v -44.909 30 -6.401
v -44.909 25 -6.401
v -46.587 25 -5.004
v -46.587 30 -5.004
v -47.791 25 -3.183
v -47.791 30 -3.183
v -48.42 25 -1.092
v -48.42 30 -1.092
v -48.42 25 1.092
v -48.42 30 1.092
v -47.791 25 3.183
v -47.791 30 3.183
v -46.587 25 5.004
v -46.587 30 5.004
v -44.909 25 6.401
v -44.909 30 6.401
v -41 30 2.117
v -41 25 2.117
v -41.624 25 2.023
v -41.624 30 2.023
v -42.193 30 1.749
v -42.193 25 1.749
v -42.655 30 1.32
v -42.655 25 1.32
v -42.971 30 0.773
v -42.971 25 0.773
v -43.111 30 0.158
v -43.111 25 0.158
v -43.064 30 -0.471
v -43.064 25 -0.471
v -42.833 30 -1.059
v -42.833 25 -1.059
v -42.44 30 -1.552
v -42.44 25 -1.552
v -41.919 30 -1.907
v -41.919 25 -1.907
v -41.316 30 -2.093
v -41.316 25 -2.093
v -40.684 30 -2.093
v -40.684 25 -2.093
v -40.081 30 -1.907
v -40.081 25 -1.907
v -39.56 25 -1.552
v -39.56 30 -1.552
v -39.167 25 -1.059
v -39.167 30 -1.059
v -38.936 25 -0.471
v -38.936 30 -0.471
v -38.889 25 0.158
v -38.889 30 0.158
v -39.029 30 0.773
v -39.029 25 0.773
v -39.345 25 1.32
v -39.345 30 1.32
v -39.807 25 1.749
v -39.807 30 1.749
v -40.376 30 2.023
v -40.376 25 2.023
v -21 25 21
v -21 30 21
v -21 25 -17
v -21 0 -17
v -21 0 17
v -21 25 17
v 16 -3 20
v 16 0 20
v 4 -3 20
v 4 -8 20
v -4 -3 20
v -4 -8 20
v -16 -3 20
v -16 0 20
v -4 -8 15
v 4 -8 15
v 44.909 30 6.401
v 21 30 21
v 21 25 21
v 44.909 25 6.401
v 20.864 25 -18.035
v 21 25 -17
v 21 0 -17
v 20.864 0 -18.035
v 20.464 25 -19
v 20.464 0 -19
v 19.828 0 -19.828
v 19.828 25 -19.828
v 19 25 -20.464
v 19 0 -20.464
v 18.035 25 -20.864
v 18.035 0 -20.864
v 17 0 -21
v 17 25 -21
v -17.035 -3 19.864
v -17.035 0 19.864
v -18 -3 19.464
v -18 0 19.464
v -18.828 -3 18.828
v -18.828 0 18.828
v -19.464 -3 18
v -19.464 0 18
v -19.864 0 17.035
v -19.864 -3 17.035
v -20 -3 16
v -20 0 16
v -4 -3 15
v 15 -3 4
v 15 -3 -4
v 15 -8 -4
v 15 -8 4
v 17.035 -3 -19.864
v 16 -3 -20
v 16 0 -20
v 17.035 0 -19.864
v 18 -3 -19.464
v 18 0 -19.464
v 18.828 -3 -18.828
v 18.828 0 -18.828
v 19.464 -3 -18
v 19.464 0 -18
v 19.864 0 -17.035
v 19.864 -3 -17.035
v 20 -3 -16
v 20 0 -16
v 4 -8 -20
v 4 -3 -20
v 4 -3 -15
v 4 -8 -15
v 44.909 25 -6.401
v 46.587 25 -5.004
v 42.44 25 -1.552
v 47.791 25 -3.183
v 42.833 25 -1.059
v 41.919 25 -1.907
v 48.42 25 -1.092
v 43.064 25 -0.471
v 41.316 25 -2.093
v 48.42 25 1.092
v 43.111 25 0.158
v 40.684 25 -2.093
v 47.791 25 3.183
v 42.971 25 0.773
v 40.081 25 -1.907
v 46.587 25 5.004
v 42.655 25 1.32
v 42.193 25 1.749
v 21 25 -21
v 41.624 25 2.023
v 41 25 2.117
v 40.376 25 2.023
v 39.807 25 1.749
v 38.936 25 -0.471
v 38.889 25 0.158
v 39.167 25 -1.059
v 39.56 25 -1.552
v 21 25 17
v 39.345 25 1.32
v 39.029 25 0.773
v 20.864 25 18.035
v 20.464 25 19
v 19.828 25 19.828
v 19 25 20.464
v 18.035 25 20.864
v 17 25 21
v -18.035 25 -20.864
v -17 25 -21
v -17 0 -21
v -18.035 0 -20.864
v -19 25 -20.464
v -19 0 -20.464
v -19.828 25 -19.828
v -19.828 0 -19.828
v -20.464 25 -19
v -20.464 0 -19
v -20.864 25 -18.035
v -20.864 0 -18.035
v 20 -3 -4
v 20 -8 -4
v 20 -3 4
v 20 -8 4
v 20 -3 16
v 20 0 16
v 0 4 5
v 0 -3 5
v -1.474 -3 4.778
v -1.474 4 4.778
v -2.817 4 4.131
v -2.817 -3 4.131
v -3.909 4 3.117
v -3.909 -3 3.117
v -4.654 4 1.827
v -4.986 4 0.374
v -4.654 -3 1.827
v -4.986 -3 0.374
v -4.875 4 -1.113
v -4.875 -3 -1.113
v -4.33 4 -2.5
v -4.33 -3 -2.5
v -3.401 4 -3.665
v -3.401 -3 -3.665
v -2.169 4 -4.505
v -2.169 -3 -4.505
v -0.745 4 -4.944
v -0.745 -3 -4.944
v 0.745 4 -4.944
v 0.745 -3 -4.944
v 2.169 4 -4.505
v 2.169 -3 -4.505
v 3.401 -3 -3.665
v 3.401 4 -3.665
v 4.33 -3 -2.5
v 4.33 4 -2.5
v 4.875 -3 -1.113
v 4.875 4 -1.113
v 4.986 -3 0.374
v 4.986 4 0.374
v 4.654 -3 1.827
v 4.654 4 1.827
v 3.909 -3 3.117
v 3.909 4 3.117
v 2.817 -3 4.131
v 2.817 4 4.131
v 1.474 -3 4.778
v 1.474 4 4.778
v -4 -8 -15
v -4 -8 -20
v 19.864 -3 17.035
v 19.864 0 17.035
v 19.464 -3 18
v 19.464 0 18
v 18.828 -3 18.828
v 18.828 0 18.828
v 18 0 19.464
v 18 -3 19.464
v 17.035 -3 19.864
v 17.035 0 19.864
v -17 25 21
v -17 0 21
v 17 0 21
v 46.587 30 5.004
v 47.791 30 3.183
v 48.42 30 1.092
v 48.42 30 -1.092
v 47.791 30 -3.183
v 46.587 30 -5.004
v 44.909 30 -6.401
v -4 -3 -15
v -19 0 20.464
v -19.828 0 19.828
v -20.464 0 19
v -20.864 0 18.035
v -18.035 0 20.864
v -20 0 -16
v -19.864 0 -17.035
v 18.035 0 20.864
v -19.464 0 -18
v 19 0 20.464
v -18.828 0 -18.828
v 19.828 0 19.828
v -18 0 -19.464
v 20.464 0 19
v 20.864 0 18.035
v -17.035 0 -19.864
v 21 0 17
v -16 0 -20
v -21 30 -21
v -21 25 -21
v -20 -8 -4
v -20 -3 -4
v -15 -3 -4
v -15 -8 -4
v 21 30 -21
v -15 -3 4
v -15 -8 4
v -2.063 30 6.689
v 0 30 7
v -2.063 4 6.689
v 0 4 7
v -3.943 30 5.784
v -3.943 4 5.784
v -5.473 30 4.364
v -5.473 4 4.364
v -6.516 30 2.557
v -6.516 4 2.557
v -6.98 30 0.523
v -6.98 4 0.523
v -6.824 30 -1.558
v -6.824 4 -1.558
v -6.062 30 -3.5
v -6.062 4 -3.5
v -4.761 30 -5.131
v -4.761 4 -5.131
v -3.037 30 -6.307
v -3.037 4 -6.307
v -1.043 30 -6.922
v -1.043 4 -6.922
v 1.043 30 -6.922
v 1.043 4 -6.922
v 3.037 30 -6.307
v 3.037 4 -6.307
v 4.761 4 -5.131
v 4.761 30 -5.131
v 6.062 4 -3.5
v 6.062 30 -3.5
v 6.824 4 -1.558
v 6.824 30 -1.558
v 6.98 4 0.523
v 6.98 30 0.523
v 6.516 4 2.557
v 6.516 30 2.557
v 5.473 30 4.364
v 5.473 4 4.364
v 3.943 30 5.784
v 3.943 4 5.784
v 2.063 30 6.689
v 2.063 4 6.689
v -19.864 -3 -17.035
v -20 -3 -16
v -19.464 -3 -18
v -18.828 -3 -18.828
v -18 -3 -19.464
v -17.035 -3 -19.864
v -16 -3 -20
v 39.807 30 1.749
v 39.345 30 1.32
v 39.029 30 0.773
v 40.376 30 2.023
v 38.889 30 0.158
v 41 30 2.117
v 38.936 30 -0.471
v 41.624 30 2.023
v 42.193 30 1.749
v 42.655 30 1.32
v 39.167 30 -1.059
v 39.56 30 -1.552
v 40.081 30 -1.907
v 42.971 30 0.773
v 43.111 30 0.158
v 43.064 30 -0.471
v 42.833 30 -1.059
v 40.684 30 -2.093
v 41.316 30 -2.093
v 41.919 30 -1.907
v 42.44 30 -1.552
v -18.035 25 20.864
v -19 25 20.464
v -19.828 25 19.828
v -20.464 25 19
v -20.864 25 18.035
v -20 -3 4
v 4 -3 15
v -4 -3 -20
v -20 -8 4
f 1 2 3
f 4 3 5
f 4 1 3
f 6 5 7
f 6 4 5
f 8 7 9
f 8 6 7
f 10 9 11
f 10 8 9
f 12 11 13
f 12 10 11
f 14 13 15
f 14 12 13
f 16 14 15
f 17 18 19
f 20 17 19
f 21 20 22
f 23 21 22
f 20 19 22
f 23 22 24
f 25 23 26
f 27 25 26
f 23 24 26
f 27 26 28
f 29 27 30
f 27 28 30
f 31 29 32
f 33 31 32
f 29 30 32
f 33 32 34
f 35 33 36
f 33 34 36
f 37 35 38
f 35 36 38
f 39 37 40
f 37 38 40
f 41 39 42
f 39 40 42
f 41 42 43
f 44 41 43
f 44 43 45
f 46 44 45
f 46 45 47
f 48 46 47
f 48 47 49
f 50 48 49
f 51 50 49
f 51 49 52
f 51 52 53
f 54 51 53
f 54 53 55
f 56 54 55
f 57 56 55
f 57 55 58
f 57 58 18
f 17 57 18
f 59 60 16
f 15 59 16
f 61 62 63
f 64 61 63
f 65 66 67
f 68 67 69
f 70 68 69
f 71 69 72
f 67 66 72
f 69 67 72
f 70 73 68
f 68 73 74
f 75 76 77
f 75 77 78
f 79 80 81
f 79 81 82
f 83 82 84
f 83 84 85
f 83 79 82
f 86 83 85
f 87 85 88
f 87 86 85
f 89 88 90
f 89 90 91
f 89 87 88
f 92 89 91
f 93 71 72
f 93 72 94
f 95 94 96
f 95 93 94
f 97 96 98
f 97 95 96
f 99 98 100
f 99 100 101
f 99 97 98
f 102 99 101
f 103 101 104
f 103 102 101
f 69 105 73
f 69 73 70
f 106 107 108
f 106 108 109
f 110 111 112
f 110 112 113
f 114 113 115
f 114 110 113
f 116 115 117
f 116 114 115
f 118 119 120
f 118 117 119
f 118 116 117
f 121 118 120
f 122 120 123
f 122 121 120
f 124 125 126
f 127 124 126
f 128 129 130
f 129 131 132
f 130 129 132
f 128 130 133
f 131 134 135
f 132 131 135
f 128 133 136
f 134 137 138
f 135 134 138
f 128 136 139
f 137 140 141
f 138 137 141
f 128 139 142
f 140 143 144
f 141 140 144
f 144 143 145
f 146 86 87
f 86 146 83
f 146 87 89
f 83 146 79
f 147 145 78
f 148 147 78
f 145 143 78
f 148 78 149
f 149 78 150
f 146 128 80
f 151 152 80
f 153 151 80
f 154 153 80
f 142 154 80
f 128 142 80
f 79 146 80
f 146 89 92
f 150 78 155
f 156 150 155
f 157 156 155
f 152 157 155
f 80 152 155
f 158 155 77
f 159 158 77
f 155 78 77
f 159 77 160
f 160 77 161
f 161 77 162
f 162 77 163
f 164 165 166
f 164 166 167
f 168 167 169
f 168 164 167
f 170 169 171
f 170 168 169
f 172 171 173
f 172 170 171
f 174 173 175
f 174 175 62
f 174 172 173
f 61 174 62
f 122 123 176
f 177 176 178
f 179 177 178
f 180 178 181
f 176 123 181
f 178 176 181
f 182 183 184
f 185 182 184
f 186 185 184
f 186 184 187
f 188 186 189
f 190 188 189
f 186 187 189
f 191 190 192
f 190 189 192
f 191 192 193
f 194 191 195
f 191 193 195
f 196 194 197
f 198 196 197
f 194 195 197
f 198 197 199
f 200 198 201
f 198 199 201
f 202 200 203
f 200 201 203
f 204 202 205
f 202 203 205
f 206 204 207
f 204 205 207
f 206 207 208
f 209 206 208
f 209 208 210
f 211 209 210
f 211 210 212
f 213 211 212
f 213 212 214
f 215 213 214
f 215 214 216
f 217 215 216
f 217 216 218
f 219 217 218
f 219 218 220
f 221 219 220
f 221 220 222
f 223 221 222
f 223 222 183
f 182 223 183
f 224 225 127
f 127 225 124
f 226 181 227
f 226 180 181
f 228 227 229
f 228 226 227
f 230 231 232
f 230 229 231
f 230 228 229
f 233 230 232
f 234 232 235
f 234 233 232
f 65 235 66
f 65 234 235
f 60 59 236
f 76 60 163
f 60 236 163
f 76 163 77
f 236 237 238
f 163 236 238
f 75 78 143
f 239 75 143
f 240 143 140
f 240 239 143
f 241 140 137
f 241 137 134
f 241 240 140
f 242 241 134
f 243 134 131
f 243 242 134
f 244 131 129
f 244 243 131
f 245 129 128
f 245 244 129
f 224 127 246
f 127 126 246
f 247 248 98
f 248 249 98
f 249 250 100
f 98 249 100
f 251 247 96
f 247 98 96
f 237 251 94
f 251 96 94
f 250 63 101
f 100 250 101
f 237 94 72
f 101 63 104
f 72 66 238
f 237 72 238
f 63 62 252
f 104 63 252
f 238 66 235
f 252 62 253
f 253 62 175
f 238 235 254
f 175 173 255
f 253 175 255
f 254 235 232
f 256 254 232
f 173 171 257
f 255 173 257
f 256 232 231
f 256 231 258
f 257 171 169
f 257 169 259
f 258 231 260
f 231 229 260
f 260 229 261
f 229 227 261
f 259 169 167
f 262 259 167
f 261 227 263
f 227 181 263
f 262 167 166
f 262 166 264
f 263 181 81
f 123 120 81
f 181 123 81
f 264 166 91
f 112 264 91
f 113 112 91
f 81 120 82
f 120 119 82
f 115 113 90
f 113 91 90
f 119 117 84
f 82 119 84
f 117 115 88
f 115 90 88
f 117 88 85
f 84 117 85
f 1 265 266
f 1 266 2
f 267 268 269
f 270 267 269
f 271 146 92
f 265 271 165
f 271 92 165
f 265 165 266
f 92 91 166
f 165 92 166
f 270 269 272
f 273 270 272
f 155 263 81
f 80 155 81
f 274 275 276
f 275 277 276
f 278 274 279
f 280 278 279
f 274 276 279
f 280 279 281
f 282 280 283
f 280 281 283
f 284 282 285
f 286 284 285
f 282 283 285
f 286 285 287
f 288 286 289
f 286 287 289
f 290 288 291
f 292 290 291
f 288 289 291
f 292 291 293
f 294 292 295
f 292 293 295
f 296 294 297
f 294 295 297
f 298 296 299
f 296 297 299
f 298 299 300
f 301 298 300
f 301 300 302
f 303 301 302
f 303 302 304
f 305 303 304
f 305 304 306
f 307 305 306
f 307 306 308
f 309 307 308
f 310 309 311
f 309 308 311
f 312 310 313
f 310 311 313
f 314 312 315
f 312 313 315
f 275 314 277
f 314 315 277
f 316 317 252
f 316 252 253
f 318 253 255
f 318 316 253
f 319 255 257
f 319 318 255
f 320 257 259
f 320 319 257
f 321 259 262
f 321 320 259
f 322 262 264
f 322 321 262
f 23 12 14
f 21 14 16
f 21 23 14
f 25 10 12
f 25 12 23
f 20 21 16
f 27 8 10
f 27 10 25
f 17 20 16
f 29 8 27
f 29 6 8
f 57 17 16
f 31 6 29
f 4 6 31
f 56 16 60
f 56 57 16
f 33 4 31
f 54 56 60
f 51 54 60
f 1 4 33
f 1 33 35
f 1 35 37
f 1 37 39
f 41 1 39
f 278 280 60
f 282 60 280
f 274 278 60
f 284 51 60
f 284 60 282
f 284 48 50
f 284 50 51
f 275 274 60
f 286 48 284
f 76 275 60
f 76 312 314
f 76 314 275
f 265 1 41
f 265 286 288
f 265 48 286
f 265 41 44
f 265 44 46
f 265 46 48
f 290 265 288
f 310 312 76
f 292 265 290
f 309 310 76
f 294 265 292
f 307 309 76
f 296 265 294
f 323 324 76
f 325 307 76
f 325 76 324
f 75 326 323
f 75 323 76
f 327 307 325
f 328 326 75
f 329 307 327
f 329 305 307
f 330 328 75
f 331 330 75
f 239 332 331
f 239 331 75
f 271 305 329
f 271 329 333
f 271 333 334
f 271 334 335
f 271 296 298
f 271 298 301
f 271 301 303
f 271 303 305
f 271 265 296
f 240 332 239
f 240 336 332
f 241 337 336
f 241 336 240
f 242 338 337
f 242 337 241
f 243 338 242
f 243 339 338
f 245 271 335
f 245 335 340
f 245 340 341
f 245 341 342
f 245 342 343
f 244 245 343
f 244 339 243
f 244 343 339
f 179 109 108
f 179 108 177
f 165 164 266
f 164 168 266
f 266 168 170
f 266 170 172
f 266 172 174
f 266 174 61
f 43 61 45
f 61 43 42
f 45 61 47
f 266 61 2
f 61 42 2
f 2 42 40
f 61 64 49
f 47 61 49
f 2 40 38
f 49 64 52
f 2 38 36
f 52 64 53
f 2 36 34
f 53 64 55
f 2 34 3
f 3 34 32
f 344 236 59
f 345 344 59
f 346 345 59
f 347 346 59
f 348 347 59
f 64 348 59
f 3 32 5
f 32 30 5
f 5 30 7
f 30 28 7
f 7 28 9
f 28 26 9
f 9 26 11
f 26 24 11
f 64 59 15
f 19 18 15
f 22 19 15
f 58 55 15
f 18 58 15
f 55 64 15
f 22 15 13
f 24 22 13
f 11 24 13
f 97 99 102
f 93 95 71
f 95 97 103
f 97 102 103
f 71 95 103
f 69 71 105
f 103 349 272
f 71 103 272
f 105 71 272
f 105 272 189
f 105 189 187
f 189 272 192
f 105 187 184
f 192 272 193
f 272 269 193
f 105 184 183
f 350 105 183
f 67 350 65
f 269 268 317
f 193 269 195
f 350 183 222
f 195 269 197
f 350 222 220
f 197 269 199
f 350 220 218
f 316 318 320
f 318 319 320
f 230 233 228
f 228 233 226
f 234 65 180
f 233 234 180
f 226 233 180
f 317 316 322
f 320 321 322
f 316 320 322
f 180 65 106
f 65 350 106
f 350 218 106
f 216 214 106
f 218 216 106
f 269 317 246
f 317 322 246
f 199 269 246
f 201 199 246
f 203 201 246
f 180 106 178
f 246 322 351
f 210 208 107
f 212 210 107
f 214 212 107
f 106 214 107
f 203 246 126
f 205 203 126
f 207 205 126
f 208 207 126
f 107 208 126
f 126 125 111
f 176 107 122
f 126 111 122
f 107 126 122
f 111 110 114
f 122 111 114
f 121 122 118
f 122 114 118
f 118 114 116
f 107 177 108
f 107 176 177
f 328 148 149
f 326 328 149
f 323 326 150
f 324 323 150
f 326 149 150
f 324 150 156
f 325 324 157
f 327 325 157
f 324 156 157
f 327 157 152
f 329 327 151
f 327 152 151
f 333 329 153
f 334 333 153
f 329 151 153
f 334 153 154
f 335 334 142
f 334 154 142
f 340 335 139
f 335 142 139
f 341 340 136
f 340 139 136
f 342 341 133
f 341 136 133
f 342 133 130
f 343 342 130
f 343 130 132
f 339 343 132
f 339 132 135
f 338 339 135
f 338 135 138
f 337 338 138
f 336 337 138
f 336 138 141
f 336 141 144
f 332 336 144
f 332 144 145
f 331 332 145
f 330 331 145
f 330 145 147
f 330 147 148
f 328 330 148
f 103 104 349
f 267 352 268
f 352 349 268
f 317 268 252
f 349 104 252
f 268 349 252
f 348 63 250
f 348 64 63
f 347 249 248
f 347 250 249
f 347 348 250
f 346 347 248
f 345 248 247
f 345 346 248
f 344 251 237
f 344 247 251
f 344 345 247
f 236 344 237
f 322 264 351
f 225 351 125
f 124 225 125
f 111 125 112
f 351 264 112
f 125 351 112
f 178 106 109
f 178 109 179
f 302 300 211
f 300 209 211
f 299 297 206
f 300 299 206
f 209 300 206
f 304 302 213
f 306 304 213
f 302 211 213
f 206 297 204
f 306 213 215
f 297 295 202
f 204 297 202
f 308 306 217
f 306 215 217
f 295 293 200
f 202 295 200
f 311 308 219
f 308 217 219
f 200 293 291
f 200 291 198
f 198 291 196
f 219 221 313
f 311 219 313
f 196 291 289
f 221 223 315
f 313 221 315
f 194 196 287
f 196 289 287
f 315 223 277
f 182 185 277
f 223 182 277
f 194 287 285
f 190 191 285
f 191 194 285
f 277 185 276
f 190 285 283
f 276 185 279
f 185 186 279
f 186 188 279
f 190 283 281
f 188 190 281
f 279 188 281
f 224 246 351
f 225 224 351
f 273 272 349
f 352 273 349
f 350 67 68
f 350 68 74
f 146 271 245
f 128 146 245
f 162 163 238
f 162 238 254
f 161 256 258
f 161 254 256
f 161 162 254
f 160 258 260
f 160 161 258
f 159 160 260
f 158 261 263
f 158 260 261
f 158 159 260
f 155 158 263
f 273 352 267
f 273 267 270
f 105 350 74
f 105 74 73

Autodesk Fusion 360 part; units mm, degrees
sketch "Sketch1" plane through (0, 0, 0) normal (0, 1, 0) x (1, 0, 0)
  line L0 (20, -20) -> (-20, -20)
  line L1 (-20, -20) -> (-20, 20)
  line L2 (-20, 20) -> (20, 20)
  line L3 (20, 20) -> (20, -20)
  line L4 (20, -20) -> (-20, 20) construction
  line L5 (-20, -20) -> (20, 20) construction
  line L6 (-20, 4) -> (-15, 4)
  line L7 (-15, 4) -> (-15, -4)
  line L8 (-15, -4) -> (-20, -4)
  line L9 (-20, -4) -> (-20, 4)
  line L10 (-4, 20) -> (4, 20)
  line L11 (4, 20) -> (4, 15)
  line L12 (4, 15) -> (-4, 15)
  line L13 (-4, 15) -> (-4, 20)
  line L14 (20, 4) -> (15, 4)
  line L15 (15, 4) -> (15, -4)
  line L16 (15, -4) -> (20, -4)
  line L17 (20, -4) -> (20, 4)
  line L18 (-4, -20) -> (4, -20)
  line L19 (4, -20) -> (4, -15)
  line L20 (4, -15) -> (-4, -15)
  line L21 (-4, -15) -> (-4, -20)
  dimension "d1" = 40
  dimension "d2" = 40
  dimension "d3" = 5
  dimension "d4" = 8
  dimension "d5" = 16
  dimension "d6" = 5
  dimension "d7" = 16
  dimension "d8" = 8
  dimension "d9" = 5
  dimension "d10" = 5
  dimension "d11" = 8
  dimension "d12" = 8
  dimension "d13" = 16
  dimension "d14" = 16
extrude "Extrude1" add sketch "Sketch1" against normal blind 3 contours L0 L1 L2 L3 L6 L7 L8 L11 L12 L13 L14 L15 L16 L19 L20 L21
extrude "Extrude2" add sketch "Sketch1" against normal blind 8 contours L0 L18 L19 L20 L21 | L3 L14 L15 L16 L17 | L1 L6 L7 L8 L9 | L2 L10 L11 L12 L13
hole "Hole1" at (0, 0, 0) direction (0, -1, 0) diameter 9 depth 30 tip angle 118
fillet "Fillet1" radius 4 4 edges at (20, -1.5, -20) (-20, -1.5, -20) (20, -1.5, 20) (-20, -1.5, 20)
sketch "Sketch2" plane through (0, 0, 0) normal (0, 1, 0) x (1, 0, 0)
  line L0 (21, 21) -> (-21, 21)
  line L1 (-21, 21) -> (-21, -21)
  line L2 (-21, -21) -> (21, -21)
  line L3 (21, -21) -> (21, 21)
  line L4 (21, 21) -> (-21, -21) construction
  line L5 (-21, 21) -> (21, -21) construction
  dimension "d24" = 42
  dimension "d25" = 42
extrude "Extrude3" add sketch "Sketch2" sketch "Sketch1" along normal blind 30 of sketch 2 contours L0 L1 L2 L3 L6 L7 L8 L11 L12 L13 L14 L15 L16 L19 L20 L21
sketch "Sketch3" plane through (0, 30, 0) normal (0, 1, 0) x (-1, 0, 0)
  line L0 (-21, 21) -> (-21, -21)
  line L1 (-21, -21) -> (21, -21)
  line L2 (21, -21) -> (21, 21)
  line L3 (21, 21) -> (-21, 21)
  circle A0 centre (41, 0) radius 7.5
  circle A1 centre (-41, 0) radius 7.5
  line L4 (-21, -21) -> (-44.9086, -6.401)
  line L5 (-21, 21) -> (-44.9086, 6.401)
  line L6 (21, 21) -> (44.9086, 6.401)
  line L7 (21, -21) -> (44.9086, -6.401)
  point P0 (41, 0)
  point P1 (-41, 0)
  dimension "d28" = 21
  dimension "d29" = 41
  dimension "d30" = 41
  dimension "d31" = 15
  dimension "d32" = 15
extrude "Extrude4" add sketch "Sketch3" against normal blind 5 contours L0 A1 L4 L5 | L2 A0 L6 L7 | A1 | A0
sketch "Sketch4" plane through (0, 0, 0) normal (0, -1, 0) x (1, 0, 0)
  circle A0 centre (0, 0) radius 4.5
  circle A1 centre (0, 0) radius 4.5
sketch "Sketch5" plane through (0, 0, 0) normal (0, 1, 0) x (-1, 0, 0)
sketch "Sketch6" plane through (0, 30, 0) normal (0, 1, 0) x (-1, 0, 0)
  circle A0 centre (0, 0) radius 4.5
hole "Hole2" at (0, 30, 0) direction (0, -1, 0) diameter 10 depth 90 tip angle 118 counterbore diameter 14 counterbore depth 26
hole "Hole3" at (-41, 30, 0) at (41, 30, 0) direction (0, -1, 0) diameter 4.234 depth 90 tip angle 118
fillet "Fillet2" radius 4 4 edges at (21, 12.5, -21) (-21, 12.5, -21) (-21, 12.5, 21) (21, 12.5, 21)
equation "d6 = d3"
equation "d7 = d5"
equation "d8 = d4"
equation "d9 = d3"
equation "d10 = d3"
equation "d11 = d4"
equation "d12 = d4"
equation "d13 = d7"
equation "d14 = d7"
